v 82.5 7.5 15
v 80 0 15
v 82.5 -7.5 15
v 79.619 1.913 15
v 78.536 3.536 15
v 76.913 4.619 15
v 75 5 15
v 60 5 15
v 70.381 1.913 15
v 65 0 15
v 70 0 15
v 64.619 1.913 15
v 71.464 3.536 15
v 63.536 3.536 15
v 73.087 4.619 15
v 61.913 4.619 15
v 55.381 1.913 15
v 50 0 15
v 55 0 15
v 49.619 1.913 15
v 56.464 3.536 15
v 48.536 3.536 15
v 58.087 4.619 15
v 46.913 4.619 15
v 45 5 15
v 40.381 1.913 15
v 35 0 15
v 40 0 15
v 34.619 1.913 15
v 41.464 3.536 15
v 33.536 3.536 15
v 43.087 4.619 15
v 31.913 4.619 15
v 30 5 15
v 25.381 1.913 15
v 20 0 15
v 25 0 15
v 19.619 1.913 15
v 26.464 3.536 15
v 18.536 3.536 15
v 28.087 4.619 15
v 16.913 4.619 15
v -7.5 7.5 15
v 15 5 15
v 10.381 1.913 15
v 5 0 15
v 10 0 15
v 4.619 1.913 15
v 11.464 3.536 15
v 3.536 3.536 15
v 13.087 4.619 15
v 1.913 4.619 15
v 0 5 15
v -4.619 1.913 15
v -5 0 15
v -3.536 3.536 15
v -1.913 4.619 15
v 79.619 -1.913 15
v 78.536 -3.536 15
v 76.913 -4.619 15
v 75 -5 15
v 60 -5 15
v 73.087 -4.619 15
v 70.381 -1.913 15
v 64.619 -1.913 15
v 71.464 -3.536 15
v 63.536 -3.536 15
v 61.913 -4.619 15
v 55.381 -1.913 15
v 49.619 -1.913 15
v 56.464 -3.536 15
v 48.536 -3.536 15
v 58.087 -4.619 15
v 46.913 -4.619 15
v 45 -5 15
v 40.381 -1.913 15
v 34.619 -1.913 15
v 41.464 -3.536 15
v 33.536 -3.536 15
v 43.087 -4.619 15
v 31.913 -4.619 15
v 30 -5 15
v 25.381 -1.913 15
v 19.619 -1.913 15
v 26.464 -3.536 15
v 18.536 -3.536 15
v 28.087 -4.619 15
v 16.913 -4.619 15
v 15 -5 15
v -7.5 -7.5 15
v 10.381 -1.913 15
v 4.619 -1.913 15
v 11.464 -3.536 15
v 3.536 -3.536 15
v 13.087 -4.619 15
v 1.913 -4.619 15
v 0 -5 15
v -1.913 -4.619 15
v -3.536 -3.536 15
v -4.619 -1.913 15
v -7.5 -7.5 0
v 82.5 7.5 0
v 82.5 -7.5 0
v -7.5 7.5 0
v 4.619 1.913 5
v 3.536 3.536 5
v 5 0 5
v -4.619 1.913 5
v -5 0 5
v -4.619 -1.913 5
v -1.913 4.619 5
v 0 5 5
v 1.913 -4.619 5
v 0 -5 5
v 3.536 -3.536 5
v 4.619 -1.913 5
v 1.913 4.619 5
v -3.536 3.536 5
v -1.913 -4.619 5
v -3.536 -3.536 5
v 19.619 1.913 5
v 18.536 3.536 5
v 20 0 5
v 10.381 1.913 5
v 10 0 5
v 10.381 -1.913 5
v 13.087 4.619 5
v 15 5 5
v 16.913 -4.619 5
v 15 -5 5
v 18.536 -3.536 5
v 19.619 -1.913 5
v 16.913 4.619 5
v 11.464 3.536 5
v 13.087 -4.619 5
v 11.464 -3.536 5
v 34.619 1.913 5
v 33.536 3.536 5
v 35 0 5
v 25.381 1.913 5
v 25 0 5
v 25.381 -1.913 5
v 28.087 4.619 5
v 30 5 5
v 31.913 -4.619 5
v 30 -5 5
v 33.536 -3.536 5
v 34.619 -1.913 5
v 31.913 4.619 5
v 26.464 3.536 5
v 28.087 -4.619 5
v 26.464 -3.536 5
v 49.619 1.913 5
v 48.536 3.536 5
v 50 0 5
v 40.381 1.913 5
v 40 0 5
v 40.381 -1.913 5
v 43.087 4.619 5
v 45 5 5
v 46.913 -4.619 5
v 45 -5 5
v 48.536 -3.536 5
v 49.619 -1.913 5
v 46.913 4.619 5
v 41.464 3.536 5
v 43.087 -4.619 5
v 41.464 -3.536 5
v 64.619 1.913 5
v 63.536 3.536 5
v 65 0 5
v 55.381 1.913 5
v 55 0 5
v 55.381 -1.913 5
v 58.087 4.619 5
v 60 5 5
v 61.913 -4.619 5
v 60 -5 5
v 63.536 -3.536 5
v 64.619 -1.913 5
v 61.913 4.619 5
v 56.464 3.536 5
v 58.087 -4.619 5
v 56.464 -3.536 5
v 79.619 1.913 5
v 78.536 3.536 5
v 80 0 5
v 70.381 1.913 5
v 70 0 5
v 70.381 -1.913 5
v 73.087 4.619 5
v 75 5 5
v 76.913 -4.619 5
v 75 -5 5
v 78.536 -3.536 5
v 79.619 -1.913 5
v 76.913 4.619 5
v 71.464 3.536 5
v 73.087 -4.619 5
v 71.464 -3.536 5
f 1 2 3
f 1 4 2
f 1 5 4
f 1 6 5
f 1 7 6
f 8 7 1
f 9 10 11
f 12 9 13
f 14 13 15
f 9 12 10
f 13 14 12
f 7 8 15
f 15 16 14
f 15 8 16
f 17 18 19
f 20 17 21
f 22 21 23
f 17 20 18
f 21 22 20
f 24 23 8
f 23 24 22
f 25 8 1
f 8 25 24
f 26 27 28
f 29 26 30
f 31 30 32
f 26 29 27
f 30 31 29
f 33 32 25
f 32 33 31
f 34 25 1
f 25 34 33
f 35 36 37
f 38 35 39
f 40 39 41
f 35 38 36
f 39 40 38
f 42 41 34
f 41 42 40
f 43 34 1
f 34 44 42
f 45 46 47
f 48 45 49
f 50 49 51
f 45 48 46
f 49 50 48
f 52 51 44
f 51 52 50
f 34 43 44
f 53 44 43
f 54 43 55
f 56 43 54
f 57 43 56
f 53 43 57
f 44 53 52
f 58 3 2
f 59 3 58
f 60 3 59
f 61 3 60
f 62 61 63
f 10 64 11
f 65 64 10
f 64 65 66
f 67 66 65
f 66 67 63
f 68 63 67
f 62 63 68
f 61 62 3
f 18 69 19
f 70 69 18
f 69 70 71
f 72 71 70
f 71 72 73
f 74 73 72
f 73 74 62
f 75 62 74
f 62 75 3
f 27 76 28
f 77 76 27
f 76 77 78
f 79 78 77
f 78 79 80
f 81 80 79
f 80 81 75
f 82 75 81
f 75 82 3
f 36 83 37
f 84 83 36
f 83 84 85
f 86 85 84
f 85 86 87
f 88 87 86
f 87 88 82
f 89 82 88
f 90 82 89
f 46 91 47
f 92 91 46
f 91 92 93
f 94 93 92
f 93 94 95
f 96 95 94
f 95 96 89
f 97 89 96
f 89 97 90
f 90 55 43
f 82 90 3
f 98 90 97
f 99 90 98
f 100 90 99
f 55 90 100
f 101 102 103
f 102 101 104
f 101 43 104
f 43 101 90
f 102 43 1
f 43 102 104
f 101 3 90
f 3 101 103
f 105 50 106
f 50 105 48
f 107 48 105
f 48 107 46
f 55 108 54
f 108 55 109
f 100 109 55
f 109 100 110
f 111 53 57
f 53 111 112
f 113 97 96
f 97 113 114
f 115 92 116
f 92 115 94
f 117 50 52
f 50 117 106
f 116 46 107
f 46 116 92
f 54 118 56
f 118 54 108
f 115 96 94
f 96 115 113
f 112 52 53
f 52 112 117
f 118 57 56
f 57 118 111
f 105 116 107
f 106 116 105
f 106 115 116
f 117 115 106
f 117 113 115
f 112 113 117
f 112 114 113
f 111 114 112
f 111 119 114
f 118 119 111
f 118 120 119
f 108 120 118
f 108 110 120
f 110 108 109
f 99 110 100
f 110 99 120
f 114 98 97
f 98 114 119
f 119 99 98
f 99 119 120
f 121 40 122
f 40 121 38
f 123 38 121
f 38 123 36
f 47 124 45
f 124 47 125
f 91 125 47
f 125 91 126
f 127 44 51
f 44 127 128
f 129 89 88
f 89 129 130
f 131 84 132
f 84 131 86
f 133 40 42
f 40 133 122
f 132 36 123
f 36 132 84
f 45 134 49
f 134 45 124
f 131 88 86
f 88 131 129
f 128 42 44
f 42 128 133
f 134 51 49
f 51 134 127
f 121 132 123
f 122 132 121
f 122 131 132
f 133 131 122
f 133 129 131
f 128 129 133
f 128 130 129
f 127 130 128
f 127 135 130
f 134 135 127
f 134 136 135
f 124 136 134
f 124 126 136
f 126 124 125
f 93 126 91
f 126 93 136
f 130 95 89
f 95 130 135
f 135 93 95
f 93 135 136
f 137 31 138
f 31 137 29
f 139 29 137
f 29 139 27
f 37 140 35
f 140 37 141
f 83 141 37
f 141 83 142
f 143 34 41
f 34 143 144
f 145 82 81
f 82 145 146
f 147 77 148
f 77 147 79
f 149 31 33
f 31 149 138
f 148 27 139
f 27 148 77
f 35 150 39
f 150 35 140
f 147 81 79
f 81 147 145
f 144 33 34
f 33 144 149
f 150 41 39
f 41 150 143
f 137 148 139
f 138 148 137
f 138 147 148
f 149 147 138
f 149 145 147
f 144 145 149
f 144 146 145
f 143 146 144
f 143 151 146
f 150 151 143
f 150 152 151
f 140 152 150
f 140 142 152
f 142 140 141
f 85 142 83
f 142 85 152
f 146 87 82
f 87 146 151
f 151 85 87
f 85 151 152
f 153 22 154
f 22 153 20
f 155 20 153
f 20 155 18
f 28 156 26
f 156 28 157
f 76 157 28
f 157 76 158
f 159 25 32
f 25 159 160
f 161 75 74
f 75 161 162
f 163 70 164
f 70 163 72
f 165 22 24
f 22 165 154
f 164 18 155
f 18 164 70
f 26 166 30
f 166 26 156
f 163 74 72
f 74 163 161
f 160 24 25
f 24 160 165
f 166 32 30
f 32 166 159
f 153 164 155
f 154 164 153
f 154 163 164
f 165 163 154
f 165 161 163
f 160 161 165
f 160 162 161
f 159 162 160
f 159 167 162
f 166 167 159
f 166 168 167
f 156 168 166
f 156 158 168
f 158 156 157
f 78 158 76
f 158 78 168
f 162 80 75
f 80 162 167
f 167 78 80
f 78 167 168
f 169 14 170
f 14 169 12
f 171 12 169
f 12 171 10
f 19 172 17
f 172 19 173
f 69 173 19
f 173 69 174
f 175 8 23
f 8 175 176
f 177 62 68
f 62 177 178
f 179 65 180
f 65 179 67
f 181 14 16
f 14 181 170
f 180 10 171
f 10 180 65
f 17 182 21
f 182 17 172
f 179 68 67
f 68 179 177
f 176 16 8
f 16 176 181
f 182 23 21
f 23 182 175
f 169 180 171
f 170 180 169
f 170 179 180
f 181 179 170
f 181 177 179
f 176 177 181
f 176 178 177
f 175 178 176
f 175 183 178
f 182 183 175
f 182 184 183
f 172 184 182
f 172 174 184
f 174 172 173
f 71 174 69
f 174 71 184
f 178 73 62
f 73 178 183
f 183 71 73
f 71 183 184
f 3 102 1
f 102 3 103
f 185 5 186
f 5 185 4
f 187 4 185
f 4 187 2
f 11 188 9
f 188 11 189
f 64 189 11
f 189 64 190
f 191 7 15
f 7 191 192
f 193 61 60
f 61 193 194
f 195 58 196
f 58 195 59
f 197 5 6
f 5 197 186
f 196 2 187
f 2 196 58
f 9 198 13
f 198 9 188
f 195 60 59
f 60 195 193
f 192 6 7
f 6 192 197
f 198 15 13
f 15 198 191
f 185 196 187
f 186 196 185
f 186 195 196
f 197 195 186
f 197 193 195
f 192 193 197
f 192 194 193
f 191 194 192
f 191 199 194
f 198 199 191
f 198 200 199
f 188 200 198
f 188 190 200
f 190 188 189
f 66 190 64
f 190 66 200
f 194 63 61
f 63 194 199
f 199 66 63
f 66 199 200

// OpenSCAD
SINGLE_CUBE_WIDTH = 15;

module HoledCube() {
    step_width = SINGLE_CUBE_WIDTH;
    step_depth = SINGLE_CUBE_WIDTH;
    step_height = SINGLE_CUBE_WIDTH;

    difference() {
        translate([0,0, step_height/2]){
            cube([step_width, step_depth, step_height], center = true);
        }
        translate([0, 0, 5]) {
            cylinder(step_height*2, 5, 5);
        }
    }
}

// HoledCube();

// single row 
cubes_per_row = 5;
for(i=[0: cubes_per_row]) {
    translate([i*SINGLE_CUBE_WIDTH,0,0]){
        HoledCube();
    }   
}
